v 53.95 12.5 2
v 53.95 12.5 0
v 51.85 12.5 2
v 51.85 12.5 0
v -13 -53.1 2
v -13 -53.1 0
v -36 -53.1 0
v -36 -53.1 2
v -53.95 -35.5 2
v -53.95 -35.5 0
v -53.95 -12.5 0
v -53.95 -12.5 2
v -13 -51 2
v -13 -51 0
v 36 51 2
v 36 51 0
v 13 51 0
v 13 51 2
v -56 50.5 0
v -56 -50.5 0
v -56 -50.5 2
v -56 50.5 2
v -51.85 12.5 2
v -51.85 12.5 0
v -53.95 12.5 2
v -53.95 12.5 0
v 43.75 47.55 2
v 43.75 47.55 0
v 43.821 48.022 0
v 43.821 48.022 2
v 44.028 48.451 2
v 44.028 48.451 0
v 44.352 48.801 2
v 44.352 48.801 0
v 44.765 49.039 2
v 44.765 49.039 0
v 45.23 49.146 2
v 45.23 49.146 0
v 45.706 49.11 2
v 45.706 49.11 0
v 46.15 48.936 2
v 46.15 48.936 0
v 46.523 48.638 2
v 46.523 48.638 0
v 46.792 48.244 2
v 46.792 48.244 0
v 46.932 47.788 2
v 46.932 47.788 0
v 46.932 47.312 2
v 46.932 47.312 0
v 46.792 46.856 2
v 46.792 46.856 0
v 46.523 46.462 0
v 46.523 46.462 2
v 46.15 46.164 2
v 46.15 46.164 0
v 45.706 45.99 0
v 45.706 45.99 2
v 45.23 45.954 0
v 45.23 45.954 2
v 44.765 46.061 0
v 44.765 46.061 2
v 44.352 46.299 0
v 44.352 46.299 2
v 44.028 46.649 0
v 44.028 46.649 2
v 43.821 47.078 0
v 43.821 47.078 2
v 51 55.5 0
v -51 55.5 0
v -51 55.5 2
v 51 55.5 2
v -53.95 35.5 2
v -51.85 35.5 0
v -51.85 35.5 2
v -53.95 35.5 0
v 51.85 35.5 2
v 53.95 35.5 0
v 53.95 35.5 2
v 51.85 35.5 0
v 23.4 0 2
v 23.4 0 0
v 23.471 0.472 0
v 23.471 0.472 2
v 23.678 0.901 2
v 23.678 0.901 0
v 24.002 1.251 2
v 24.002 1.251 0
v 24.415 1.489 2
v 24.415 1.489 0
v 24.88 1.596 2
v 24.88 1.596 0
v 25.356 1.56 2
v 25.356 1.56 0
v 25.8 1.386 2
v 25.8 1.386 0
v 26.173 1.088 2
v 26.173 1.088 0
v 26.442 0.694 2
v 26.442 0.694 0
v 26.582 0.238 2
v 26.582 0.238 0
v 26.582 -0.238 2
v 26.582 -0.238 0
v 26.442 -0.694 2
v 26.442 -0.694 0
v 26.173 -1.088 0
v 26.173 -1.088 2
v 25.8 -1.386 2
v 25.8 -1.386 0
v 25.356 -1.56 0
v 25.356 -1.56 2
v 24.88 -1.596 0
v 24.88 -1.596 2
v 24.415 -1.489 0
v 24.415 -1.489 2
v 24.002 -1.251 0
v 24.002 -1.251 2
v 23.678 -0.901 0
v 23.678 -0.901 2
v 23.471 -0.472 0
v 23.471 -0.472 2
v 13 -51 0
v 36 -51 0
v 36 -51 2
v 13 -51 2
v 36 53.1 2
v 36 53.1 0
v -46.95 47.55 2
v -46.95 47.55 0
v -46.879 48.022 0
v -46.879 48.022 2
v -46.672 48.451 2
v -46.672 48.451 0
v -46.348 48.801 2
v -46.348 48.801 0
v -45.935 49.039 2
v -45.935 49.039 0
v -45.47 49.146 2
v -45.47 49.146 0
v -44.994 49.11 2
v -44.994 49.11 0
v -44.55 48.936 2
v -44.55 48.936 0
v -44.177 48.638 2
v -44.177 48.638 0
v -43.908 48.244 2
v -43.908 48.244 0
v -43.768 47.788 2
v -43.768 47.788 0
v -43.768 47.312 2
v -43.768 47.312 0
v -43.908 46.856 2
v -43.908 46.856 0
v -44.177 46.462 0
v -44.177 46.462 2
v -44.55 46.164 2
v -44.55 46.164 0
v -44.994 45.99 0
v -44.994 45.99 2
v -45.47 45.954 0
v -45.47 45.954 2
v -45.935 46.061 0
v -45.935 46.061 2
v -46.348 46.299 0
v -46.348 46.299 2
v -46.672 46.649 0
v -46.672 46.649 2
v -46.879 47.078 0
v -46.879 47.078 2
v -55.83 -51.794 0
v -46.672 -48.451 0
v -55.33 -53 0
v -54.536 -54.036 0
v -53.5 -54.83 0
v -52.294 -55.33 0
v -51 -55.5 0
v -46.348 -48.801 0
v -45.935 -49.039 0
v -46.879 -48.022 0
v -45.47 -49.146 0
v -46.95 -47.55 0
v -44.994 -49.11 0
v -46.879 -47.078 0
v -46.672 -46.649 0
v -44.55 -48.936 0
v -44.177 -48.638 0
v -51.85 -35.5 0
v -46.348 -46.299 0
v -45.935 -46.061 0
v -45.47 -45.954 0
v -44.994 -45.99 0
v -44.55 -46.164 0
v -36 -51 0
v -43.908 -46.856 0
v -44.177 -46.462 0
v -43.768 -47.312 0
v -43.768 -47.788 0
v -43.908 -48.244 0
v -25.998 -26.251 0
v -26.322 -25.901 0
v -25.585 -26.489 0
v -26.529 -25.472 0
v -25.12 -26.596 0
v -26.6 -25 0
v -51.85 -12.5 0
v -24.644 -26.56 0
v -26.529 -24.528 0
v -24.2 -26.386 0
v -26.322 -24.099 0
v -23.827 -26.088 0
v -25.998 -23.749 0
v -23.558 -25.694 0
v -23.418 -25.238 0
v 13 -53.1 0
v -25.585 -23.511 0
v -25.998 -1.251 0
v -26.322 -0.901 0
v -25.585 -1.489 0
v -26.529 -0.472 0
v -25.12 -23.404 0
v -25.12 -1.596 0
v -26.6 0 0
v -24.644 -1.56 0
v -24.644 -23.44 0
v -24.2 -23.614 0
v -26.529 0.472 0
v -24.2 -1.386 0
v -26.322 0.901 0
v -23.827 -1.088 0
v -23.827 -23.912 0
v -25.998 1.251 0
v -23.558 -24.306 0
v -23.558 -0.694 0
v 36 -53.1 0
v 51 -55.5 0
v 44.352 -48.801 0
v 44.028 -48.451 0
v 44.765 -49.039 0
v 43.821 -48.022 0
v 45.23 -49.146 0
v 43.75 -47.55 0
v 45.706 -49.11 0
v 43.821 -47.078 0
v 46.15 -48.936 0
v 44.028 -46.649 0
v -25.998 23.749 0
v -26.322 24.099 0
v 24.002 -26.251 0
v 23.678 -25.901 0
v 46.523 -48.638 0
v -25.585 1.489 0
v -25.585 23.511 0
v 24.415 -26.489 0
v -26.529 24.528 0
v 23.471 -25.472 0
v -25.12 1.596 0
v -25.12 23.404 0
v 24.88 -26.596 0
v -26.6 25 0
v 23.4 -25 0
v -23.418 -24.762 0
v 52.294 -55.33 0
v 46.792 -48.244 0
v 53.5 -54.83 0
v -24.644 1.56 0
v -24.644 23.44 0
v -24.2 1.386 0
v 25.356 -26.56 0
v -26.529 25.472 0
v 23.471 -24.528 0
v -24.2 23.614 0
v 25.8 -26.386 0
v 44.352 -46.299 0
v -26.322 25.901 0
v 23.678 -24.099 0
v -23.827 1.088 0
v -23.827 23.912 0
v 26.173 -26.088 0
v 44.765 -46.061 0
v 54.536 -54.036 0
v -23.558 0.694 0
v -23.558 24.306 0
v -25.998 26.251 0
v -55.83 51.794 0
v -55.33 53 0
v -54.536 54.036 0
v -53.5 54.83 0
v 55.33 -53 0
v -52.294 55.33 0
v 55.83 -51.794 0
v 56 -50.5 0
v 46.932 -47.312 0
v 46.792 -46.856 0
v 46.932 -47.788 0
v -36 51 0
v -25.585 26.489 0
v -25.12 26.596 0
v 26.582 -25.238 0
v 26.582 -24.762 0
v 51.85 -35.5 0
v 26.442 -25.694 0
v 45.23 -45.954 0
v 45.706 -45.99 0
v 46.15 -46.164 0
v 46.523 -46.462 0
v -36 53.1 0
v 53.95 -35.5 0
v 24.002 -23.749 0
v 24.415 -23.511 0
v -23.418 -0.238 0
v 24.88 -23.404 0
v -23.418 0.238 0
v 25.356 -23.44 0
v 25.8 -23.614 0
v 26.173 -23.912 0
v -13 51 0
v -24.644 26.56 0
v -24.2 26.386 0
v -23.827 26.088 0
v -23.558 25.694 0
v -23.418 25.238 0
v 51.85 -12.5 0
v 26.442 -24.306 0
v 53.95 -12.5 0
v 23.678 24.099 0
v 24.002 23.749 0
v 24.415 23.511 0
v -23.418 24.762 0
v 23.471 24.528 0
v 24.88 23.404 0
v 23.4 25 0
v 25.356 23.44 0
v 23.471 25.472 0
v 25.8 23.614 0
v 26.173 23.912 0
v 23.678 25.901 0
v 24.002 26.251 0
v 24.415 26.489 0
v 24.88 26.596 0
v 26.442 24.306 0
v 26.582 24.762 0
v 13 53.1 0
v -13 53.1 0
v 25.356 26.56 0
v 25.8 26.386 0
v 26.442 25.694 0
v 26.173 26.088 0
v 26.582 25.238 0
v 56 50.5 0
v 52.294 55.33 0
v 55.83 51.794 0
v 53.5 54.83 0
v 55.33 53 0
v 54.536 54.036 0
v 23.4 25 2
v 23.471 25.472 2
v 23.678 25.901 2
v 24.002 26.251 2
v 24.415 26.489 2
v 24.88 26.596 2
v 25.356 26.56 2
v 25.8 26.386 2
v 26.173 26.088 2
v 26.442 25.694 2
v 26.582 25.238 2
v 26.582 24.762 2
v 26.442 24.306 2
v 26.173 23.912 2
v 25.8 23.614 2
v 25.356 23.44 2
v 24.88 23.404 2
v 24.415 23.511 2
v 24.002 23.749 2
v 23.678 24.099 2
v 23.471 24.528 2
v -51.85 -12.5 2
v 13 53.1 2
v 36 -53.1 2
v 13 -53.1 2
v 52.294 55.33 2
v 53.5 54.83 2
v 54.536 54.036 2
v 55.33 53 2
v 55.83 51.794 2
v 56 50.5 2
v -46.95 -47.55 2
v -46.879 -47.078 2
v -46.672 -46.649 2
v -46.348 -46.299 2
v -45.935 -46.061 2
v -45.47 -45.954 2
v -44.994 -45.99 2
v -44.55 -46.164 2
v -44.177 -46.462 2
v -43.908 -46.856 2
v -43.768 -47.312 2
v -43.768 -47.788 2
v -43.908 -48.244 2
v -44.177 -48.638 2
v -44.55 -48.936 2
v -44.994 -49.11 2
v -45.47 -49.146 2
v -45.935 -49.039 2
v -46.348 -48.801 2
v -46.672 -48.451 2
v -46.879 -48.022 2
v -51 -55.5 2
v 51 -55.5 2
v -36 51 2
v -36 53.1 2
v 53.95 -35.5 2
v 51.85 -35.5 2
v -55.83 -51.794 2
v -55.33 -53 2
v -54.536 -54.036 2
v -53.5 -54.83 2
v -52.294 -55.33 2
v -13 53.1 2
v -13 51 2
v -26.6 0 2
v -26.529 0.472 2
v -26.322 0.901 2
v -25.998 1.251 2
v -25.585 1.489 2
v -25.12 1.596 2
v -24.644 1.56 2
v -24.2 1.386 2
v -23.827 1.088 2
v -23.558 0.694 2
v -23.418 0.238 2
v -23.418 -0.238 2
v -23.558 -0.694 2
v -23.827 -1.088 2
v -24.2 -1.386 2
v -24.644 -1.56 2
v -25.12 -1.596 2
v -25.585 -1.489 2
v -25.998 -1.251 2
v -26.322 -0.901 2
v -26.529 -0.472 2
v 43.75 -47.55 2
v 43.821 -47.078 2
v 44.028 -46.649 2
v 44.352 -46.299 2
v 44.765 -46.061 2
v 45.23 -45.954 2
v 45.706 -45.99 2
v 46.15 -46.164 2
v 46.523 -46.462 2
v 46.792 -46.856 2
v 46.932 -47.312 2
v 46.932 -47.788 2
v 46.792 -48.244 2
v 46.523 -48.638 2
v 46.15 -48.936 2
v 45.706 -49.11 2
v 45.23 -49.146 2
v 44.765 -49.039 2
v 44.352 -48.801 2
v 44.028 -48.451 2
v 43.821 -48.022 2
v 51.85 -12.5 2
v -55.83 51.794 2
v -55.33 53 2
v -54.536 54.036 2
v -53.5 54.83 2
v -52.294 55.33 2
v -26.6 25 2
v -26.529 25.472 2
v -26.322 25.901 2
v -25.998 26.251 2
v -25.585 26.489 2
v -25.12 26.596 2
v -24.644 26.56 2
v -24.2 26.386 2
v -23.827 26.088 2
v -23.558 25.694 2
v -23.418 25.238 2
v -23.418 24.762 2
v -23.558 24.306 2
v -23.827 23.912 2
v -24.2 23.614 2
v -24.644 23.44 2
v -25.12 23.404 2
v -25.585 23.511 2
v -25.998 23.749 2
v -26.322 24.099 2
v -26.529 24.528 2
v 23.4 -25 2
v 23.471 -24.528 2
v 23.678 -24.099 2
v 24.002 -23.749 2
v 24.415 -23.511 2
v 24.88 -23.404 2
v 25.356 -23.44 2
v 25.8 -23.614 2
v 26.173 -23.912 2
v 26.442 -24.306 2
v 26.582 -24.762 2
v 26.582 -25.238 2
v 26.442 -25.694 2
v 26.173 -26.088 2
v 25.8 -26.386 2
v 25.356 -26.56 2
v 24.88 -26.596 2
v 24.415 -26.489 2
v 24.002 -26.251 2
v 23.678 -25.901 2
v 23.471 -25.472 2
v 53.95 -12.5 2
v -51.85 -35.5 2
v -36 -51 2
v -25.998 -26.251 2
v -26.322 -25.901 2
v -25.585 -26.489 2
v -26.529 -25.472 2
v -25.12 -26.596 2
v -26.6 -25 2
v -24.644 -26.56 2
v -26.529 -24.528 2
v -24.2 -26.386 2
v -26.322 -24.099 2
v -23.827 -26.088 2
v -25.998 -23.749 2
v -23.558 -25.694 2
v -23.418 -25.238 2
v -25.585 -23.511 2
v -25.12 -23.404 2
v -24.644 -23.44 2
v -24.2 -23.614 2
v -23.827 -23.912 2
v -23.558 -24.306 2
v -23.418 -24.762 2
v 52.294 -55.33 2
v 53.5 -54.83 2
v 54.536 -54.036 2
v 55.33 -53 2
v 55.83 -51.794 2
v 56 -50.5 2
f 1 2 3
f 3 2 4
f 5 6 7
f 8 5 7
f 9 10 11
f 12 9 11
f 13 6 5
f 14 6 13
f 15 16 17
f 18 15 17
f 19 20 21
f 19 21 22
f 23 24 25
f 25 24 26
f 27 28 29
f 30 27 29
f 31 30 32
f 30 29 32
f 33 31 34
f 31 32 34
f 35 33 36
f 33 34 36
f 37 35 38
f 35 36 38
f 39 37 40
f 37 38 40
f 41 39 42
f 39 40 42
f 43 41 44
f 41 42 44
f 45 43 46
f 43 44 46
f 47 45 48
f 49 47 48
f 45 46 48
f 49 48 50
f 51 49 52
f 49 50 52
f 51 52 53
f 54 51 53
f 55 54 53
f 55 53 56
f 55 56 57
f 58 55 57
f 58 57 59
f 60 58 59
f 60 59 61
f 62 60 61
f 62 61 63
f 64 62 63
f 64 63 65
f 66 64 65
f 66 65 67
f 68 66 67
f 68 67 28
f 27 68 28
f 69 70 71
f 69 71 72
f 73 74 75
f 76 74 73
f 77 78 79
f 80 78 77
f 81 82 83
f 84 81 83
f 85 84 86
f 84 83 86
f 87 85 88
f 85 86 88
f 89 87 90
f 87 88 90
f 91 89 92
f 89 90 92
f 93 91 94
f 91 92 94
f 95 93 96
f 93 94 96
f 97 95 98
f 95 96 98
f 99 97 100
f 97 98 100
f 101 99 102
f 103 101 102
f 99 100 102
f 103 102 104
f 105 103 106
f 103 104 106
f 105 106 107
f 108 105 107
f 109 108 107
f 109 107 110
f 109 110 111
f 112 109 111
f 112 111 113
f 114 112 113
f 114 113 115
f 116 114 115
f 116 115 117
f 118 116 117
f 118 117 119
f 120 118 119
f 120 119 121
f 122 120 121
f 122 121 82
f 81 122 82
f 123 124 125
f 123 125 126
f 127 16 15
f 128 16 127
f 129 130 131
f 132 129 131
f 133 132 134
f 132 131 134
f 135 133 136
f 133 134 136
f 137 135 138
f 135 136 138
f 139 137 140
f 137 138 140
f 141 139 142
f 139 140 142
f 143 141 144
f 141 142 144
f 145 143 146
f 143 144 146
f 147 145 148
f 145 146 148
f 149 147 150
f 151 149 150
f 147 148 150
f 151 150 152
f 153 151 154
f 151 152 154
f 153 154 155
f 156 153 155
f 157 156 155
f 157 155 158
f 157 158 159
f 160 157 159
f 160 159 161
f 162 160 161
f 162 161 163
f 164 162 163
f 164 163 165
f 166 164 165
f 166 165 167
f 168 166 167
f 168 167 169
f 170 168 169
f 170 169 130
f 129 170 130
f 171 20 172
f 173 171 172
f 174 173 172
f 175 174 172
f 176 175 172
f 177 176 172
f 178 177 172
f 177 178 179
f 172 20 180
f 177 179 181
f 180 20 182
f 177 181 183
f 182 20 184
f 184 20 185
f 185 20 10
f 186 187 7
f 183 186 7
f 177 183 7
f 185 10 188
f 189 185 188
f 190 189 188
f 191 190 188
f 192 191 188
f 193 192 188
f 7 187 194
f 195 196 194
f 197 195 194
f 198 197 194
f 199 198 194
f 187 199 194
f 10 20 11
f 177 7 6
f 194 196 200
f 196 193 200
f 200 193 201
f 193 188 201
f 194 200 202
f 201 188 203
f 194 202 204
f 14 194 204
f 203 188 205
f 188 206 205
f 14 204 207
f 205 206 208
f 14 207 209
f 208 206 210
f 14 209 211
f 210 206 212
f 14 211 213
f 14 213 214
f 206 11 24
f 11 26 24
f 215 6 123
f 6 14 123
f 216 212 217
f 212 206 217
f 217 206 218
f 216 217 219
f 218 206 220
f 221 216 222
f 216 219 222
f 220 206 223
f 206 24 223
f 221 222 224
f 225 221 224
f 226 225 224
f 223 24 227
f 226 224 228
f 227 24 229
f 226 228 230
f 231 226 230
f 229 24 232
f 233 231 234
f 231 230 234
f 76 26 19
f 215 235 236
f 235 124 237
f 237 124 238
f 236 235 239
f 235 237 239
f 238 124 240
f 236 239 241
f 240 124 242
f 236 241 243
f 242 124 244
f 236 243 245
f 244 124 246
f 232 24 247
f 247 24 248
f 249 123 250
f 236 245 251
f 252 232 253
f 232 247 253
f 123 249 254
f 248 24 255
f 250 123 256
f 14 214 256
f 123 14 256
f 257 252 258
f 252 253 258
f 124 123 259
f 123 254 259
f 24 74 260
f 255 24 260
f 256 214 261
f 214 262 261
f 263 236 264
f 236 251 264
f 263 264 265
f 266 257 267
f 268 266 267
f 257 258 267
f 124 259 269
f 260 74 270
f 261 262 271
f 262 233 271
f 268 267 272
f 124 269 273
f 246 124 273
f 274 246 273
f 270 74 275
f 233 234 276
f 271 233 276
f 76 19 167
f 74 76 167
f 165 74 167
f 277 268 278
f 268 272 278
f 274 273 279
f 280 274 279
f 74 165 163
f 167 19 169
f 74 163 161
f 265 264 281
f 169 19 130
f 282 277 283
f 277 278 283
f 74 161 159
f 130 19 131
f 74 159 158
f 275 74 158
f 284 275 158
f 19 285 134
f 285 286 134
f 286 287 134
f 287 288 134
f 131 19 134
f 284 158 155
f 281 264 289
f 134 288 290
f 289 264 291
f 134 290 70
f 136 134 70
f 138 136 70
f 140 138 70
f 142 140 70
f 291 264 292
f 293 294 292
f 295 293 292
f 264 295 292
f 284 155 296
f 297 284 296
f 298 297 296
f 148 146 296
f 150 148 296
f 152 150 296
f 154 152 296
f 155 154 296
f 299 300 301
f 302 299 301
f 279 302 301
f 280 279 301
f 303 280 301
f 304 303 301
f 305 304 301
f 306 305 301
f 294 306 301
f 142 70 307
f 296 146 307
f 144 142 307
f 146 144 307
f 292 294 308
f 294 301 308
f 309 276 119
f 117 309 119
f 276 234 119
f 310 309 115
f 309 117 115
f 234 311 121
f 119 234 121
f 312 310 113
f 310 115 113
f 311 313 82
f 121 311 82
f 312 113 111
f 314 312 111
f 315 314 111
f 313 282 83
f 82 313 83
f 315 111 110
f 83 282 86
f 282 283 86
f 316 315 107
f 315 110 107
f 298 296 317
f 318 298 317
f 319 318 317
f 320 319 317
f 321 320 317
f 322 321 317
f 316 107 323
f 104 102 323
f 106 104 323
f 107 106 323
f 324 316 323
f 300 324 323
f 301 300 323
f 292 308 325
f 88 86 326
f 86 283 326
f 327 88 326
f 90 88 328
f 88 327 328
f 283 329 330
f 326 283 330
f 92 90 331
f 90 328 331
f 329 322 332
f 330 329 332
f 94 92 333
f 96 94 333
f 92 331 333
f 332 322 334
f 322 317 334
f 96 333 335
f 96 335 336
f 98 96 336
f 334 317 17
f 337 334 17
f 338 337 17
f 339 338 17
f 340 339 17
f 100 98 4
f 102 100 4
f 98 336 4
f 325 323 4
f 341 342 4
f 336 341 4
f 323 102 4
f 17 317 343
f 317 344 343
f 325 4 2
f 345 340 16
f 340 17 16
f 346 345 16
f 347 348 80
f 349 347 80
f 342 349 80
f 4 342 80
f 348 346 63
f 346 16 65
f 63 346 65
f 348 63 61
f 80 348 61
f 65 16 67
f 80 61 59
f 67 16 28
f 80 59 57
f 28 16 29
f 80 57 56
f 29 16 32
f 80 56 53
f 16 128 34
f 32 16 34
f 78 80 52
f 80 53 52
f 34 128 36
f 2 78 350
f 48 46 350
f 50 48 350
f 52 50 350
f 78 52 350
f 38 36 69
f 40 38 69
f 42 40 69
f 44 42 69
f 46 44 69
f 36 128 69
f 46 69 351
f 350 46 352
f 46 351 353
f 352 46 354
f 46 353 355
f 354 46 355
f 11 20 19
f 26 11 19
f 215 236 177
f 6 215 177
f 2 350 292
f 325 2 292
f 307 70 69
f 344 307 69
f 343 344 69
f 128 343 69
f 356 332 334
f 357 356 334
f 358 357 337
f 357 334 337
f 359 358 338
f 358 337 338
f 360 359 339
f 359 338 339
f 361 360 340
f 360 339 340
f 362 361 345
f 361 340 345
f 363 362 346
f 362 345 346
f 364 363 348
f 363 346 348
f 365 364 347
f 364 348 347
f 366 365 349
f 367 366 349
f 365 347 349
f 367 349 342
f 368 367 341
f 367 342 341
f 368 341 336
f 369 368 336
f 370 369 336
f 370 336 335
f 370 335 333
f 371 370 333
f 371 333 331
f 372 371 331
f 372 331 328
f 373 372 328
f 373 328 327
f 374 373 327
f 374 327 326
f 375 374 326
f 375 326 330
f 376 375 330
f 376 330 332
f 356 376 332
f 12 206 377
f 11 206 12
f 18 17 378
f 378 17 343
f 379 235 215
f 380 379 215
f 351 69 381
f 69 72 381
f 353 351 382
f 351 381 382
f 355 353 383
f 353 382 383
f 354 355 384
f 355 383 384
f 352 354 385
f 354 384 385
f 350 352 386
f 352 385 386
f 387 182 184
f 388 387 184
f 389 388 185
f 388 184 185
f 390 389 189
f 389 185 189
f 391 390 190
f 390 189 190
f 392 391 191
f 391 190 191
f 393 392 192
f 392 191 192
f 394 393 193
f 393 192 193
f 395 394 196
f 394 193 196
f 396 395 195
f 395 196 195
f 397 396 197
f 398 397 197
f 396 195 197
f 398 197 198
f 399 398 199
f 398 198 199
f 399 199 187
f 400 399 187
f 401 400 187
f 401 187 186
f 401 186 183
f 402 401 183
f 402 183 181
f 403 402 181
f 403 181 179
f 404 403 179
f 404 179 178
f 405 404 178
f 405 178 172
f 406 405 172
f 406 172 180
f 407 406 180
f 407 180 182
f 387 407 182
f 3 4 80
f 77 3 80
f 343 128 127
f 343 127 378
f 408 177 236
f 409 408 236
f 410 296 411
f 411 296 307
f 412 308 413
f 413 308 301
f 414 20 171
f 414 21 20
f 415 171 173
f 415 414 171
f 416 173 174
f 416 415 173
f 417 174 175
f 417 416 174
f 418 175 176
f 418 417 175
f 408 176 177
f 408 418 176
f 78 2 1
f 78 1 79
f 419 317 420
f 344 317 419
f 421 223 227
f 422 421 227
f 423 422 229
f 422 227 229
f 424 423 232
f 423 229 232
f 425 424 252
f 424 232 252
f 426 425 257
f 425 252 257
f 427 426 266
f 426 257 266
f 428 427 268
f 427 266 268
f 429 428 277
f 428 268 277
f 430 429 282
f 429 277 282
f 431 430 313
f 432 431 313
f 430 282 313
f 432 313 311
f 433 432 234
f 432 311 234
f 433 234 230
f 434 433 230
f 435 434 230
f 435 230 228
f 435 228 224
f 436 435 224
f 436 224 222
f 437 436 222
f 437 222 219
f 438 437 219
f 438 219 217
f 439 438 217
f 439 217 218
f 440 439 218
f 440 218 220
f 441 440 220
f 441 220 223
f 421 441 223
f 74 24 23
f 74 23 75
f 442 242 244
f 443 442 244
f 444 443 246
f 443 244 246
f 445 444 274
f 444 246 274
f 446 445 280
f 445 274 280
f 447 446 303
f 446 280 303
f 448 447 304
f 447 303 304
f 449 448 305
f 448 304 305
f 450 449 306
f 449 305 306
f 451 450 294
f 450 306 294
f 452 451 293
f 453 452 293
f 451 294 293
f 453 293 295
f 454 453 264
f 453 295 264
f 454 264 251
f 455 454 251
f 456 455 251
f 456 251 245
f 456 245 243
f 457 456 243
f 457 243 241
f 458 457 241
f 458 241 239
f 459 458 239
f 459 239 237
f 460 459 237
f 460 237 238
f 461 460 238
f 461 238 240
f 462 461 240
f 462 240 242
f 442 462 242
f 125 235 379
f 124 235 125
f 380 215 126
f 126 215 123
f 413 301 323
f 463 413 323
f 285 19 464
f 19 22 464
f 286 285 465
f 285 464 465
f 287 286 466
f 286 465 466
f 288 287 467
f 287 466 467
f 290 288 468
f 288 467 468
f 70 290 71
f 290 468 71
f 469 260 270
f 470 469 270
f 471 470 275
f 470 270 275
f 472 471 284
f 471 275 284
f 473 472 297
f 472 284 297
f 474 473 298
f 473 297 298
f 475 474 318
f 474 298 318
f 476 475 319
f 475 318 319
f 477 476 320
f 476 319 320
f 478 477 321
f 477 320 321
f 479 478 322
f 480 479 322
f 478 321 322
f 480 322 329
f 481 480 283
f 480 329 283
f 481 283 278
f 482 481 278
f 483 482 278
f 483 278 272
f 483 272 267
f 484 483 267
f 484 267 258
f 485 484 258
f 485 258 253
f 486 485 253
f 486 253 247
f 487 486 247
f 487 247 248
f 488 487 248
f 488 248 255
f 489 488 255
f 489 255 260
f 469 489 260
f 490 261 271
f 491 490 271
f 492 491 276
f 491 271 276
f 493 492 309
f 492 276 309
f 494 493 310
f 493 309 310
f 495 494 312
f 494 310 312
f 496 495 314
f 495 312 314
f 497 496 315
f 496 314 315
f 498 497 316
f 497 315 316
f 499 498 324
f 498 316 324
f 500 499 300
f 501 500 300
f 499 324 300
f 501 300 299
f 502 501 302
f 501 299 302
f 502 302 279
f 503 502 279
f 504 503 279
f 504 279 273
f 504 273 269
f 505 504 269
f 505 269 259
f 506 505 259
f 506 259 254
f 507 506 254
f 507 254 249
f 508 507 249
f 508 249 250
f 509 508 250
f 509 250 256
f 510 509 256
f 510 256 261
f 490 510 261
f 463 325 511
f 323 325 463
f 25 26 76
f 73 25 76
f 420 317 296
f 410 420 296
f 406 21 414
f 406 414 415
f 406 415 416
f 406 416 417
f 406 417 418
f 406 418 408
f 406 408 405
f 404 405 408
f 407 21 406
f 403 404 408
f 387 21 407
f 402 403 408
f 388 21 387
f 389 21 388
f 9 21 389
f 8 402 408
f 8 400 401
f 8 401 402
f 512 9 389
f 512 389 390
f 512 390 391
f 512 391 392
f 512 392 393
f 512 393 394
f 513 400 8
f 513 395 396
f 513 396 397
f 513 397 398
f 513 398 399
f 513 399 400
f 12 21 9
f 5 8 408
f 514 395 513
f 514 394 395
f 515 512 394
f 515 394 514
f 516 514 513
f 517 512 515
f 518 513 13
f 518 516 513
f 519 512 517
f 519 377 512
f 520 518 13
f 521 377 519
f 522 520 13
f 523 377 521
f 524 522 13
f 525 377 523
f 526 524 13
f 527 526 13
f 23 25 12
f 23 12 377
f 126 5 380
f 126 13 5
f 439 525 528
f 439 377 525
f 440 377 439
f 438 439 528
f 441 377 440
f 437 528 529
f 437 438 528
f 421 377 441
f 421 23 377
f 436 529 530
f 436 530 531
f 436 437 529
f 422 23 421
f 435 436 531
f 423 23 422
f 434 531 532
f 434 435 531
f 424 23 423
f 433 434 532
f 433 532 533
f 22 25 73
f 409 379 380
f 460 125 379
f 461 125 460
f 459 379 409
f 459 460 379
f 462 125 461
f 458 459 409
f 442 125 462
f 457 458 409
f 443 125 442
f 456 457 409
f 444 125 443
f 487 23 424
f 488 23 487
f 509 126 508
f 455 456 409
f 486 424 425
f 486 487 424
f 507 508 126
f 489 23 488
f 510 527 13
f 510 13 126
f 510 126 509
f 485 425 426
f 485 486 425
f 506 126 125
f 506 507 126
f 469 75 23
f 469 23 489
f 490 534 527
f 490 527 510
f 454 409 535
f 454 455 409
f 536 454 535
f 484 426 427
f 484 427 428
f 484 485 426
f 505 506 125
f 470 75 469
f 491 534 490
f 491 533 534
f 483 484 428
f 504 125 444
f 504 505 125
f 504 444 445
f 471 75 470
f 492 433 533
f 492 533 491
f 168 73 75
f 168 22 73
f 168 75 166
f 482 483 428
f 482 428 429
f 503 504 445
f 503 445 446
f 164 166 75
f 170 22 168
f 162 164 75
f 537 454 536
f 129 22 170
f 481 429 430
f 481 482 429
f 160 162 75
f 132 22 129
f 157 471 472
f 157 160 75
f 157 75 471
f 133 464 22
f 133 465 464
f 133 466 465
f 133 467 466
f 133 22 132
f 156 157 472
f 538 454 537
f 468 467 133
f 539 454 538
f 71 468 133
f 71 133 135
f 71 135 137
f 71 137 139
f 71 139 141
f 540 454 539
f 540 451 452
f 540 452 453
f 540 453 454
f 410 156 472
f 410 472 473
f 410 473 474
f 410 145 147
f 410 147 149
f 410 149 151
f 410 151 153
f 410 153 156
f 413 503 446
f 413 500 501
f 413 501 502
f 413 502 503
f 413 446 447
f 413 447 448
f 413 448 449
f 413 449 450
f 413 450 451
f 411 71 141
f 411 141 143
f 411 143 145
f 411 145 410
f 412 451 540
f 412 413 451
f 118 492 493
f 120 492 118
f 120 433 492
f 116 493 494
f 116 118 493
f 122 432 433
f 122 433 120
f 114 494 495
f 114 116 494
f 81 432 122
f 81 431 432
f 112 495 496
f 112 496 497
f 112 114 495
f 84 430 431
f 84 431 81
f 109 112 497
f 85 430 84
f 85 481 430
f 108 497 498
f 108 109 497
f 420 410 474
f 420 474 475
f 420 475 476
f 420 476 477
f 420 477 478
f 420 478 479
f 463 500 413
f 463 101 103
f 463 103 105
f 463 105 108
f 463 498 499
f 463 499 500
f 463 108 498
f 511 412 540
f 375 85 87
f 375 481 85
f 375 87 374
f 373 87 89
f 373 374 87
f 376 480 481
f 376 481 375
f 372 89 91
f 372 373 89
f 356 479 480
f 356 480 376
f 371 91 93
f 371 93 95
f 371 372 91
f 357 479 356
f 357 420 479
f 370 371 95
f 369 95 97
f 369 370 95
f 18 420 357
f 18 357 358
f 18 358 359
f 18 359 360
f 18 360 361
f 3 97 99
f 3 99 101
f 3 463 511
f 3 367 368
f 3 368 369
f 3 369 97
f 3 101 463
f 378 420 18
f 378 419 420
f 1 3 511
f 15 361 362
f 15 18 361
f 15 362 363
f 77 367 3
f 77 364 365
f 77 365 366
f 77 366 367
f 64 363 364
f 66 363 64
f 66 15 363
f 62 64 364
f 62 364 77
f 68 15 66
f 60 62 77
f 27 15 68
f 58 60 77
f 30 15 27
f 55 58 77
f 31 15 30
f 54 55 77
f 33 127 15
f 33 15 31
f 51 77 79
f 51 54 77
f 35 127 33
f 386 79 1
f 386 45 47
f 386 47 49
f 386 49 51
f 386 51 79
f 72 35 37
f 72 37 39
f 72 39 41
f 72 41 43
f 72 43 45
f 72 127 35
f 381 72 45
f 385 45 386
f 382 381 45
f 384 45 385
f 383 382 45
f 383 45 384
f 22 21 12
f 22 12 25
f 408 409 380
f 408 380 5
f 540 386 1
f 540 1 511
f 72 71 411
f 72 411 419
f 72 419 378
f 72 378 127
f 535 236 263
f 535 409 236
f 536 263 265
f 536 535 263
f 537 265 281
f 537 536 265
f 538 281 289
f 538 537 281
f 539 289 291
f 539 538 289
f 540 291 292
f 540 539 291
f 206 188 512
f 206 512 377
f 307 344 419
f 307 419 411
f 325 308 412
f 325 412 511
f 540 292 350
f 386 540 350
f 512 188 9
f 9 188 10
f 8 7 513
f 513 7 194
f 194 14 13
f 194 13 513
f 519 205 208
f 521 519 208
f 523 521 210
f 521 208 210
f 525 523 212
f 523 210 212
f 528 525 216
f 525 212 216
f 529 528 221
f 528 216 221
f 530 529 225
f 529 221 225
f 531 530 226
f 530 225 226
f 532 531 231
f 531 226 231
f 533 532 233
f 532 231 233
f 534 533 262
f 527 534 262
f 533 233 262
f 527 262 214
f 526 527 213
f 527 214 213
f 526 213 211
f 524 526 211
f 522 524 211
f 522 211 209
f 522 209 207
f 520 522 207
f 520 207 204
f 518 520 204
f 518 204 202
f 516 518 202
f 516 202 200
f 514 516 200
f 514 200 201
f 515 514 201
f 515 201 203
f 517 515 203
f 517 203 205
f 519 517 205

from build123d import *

# Parameters (mm, degrees)
SKETCH_1_W          = 112
SKETCH_1_H          = 111
EXTRUDE_1_DEPTH     = 2
SKETCH_2_R          = 1.6
CUT_EXTRUDE_1_DEPTH = 3
SKETCH_3_W          = 2.1
SKETCH_3_H          = 23
SKETCH_3_W_2        = 23
SKETCH_3_H_2        = 2.1
CUT_EXTRUDE_2_DEPTH = 3
SKETCH_4_R          = 1.6
CUT_EXTRUDE_3_DEPTH = 3
FILLET_1_R          = 5


with BuildPart() as part:
    # 草图1 → 凸台-拉伸1 (new body)
    with BuildSketch(Plane.XY):
        Rectangle(SKETCH_1_W, SKETCH_1_H)
    extrude(amount=EXTRUDE_1_DEPTH)

    # 草图2 → 切除-拉伸1 (cut, through all)
    with BuildSketch(Plane(origin=(0, 0, 0), x_dir=(-1, 0, 0), z_dir=(0, 0, -1))):
        with Locations((-45.35, -47.55)):
            Circle(SKETCH_2_R)
        with Locations((45.35, -47.55)):
            Circle(SKETCH_2_R)
        with Locations((45.35, 47.55)):
            Circle(SKETCH_2_R)
        with Locations((-45.35, 47.55)):
            Circle(SKETCH_2_R)
    extrude(amount=-CUT_EXTRUDE_1_DEPTH, mode=Mode.SUBTRACT)

    # 草图3 → 切除-拉伸2 (cut, through all)
    with BuildSketch(Plane(origin=(0, 0, 0), x_dir=(-1, 0, 0), z_dir=(0, 0, -1))):
        with Locations((-52.9, 24)):
            Rectangle(SKETCH_3_W, SKETCH_3_H)
        with Locations((-52.9, -24)):
            Rectangle(SKETCH_3_W, SKETCH_3_H)
        with Locations((52.9, -24)):
            Rectangle(SKETCH_3_W, SKETCH_3_H)
        with Locations((52.9, 24)):
            Rectangle(SKETCH_3_W, SKETCH_3_H)
        with Locations((-24.5, -52.05)):
            Rectangle(SKETCH_3_W_2, SKETCH_3_H_2)
        with Locations((24.5, -52.05)):
            Rectangle(SKETCH_3_W_2, SKETCH_3_H_2)
        with Locations((24.5, 52.05)):
            Rectangle(SKETCH_3_W_2, SKETCH_3_H_2)
        with Locations((-24.5, 52.05)):
            Rectangle(SKETCH_3_W_2, SKETCH_3_H_2)
    extrude(amount=-CUT_EXTRUDE_2_DEPTH, mode=Mode.SUBTRACT)

    # 草图4 → 切除-拉伸3 (cut, through all)
    with BuildSketch(Plane(origin=(0, 0, 0), x_dir=(-1, 0, 0), z_dir=(0, 0, -1))):
        with Locations((-25, -25)):
            Circle(SKETCH_4_R)
        with Locations((25, -25)):
            Circle(SKETCH_4_R)
        with Locations((25, 0)):
            Circle(SKETCH_4_R)
        with Locations((25, 25)):
            Circle(SKETCH_4_R)
        with Locations((-25, 0)):
            Circle(SKETCH_4_R)
        with Locations((-25, 25)):
            Circle(SKETCH_4_R)
    extrude(amount=-CUT_EXTRUDE_3_DEPTH, mode=Mode.SUBTRACT)

    # 圆角1
    fillet_1_edges = [part.edges().sort_by_distance(p)[0] for p in [
        (56, -55.5, 1),
        (-56, -55.5, 1),
        (-56, 55.5, 1),
        (56, 55.5, 1),
    ]]
    fillet(fillet_1_edges, radius=FILLET_1_R)


solid = part.part
